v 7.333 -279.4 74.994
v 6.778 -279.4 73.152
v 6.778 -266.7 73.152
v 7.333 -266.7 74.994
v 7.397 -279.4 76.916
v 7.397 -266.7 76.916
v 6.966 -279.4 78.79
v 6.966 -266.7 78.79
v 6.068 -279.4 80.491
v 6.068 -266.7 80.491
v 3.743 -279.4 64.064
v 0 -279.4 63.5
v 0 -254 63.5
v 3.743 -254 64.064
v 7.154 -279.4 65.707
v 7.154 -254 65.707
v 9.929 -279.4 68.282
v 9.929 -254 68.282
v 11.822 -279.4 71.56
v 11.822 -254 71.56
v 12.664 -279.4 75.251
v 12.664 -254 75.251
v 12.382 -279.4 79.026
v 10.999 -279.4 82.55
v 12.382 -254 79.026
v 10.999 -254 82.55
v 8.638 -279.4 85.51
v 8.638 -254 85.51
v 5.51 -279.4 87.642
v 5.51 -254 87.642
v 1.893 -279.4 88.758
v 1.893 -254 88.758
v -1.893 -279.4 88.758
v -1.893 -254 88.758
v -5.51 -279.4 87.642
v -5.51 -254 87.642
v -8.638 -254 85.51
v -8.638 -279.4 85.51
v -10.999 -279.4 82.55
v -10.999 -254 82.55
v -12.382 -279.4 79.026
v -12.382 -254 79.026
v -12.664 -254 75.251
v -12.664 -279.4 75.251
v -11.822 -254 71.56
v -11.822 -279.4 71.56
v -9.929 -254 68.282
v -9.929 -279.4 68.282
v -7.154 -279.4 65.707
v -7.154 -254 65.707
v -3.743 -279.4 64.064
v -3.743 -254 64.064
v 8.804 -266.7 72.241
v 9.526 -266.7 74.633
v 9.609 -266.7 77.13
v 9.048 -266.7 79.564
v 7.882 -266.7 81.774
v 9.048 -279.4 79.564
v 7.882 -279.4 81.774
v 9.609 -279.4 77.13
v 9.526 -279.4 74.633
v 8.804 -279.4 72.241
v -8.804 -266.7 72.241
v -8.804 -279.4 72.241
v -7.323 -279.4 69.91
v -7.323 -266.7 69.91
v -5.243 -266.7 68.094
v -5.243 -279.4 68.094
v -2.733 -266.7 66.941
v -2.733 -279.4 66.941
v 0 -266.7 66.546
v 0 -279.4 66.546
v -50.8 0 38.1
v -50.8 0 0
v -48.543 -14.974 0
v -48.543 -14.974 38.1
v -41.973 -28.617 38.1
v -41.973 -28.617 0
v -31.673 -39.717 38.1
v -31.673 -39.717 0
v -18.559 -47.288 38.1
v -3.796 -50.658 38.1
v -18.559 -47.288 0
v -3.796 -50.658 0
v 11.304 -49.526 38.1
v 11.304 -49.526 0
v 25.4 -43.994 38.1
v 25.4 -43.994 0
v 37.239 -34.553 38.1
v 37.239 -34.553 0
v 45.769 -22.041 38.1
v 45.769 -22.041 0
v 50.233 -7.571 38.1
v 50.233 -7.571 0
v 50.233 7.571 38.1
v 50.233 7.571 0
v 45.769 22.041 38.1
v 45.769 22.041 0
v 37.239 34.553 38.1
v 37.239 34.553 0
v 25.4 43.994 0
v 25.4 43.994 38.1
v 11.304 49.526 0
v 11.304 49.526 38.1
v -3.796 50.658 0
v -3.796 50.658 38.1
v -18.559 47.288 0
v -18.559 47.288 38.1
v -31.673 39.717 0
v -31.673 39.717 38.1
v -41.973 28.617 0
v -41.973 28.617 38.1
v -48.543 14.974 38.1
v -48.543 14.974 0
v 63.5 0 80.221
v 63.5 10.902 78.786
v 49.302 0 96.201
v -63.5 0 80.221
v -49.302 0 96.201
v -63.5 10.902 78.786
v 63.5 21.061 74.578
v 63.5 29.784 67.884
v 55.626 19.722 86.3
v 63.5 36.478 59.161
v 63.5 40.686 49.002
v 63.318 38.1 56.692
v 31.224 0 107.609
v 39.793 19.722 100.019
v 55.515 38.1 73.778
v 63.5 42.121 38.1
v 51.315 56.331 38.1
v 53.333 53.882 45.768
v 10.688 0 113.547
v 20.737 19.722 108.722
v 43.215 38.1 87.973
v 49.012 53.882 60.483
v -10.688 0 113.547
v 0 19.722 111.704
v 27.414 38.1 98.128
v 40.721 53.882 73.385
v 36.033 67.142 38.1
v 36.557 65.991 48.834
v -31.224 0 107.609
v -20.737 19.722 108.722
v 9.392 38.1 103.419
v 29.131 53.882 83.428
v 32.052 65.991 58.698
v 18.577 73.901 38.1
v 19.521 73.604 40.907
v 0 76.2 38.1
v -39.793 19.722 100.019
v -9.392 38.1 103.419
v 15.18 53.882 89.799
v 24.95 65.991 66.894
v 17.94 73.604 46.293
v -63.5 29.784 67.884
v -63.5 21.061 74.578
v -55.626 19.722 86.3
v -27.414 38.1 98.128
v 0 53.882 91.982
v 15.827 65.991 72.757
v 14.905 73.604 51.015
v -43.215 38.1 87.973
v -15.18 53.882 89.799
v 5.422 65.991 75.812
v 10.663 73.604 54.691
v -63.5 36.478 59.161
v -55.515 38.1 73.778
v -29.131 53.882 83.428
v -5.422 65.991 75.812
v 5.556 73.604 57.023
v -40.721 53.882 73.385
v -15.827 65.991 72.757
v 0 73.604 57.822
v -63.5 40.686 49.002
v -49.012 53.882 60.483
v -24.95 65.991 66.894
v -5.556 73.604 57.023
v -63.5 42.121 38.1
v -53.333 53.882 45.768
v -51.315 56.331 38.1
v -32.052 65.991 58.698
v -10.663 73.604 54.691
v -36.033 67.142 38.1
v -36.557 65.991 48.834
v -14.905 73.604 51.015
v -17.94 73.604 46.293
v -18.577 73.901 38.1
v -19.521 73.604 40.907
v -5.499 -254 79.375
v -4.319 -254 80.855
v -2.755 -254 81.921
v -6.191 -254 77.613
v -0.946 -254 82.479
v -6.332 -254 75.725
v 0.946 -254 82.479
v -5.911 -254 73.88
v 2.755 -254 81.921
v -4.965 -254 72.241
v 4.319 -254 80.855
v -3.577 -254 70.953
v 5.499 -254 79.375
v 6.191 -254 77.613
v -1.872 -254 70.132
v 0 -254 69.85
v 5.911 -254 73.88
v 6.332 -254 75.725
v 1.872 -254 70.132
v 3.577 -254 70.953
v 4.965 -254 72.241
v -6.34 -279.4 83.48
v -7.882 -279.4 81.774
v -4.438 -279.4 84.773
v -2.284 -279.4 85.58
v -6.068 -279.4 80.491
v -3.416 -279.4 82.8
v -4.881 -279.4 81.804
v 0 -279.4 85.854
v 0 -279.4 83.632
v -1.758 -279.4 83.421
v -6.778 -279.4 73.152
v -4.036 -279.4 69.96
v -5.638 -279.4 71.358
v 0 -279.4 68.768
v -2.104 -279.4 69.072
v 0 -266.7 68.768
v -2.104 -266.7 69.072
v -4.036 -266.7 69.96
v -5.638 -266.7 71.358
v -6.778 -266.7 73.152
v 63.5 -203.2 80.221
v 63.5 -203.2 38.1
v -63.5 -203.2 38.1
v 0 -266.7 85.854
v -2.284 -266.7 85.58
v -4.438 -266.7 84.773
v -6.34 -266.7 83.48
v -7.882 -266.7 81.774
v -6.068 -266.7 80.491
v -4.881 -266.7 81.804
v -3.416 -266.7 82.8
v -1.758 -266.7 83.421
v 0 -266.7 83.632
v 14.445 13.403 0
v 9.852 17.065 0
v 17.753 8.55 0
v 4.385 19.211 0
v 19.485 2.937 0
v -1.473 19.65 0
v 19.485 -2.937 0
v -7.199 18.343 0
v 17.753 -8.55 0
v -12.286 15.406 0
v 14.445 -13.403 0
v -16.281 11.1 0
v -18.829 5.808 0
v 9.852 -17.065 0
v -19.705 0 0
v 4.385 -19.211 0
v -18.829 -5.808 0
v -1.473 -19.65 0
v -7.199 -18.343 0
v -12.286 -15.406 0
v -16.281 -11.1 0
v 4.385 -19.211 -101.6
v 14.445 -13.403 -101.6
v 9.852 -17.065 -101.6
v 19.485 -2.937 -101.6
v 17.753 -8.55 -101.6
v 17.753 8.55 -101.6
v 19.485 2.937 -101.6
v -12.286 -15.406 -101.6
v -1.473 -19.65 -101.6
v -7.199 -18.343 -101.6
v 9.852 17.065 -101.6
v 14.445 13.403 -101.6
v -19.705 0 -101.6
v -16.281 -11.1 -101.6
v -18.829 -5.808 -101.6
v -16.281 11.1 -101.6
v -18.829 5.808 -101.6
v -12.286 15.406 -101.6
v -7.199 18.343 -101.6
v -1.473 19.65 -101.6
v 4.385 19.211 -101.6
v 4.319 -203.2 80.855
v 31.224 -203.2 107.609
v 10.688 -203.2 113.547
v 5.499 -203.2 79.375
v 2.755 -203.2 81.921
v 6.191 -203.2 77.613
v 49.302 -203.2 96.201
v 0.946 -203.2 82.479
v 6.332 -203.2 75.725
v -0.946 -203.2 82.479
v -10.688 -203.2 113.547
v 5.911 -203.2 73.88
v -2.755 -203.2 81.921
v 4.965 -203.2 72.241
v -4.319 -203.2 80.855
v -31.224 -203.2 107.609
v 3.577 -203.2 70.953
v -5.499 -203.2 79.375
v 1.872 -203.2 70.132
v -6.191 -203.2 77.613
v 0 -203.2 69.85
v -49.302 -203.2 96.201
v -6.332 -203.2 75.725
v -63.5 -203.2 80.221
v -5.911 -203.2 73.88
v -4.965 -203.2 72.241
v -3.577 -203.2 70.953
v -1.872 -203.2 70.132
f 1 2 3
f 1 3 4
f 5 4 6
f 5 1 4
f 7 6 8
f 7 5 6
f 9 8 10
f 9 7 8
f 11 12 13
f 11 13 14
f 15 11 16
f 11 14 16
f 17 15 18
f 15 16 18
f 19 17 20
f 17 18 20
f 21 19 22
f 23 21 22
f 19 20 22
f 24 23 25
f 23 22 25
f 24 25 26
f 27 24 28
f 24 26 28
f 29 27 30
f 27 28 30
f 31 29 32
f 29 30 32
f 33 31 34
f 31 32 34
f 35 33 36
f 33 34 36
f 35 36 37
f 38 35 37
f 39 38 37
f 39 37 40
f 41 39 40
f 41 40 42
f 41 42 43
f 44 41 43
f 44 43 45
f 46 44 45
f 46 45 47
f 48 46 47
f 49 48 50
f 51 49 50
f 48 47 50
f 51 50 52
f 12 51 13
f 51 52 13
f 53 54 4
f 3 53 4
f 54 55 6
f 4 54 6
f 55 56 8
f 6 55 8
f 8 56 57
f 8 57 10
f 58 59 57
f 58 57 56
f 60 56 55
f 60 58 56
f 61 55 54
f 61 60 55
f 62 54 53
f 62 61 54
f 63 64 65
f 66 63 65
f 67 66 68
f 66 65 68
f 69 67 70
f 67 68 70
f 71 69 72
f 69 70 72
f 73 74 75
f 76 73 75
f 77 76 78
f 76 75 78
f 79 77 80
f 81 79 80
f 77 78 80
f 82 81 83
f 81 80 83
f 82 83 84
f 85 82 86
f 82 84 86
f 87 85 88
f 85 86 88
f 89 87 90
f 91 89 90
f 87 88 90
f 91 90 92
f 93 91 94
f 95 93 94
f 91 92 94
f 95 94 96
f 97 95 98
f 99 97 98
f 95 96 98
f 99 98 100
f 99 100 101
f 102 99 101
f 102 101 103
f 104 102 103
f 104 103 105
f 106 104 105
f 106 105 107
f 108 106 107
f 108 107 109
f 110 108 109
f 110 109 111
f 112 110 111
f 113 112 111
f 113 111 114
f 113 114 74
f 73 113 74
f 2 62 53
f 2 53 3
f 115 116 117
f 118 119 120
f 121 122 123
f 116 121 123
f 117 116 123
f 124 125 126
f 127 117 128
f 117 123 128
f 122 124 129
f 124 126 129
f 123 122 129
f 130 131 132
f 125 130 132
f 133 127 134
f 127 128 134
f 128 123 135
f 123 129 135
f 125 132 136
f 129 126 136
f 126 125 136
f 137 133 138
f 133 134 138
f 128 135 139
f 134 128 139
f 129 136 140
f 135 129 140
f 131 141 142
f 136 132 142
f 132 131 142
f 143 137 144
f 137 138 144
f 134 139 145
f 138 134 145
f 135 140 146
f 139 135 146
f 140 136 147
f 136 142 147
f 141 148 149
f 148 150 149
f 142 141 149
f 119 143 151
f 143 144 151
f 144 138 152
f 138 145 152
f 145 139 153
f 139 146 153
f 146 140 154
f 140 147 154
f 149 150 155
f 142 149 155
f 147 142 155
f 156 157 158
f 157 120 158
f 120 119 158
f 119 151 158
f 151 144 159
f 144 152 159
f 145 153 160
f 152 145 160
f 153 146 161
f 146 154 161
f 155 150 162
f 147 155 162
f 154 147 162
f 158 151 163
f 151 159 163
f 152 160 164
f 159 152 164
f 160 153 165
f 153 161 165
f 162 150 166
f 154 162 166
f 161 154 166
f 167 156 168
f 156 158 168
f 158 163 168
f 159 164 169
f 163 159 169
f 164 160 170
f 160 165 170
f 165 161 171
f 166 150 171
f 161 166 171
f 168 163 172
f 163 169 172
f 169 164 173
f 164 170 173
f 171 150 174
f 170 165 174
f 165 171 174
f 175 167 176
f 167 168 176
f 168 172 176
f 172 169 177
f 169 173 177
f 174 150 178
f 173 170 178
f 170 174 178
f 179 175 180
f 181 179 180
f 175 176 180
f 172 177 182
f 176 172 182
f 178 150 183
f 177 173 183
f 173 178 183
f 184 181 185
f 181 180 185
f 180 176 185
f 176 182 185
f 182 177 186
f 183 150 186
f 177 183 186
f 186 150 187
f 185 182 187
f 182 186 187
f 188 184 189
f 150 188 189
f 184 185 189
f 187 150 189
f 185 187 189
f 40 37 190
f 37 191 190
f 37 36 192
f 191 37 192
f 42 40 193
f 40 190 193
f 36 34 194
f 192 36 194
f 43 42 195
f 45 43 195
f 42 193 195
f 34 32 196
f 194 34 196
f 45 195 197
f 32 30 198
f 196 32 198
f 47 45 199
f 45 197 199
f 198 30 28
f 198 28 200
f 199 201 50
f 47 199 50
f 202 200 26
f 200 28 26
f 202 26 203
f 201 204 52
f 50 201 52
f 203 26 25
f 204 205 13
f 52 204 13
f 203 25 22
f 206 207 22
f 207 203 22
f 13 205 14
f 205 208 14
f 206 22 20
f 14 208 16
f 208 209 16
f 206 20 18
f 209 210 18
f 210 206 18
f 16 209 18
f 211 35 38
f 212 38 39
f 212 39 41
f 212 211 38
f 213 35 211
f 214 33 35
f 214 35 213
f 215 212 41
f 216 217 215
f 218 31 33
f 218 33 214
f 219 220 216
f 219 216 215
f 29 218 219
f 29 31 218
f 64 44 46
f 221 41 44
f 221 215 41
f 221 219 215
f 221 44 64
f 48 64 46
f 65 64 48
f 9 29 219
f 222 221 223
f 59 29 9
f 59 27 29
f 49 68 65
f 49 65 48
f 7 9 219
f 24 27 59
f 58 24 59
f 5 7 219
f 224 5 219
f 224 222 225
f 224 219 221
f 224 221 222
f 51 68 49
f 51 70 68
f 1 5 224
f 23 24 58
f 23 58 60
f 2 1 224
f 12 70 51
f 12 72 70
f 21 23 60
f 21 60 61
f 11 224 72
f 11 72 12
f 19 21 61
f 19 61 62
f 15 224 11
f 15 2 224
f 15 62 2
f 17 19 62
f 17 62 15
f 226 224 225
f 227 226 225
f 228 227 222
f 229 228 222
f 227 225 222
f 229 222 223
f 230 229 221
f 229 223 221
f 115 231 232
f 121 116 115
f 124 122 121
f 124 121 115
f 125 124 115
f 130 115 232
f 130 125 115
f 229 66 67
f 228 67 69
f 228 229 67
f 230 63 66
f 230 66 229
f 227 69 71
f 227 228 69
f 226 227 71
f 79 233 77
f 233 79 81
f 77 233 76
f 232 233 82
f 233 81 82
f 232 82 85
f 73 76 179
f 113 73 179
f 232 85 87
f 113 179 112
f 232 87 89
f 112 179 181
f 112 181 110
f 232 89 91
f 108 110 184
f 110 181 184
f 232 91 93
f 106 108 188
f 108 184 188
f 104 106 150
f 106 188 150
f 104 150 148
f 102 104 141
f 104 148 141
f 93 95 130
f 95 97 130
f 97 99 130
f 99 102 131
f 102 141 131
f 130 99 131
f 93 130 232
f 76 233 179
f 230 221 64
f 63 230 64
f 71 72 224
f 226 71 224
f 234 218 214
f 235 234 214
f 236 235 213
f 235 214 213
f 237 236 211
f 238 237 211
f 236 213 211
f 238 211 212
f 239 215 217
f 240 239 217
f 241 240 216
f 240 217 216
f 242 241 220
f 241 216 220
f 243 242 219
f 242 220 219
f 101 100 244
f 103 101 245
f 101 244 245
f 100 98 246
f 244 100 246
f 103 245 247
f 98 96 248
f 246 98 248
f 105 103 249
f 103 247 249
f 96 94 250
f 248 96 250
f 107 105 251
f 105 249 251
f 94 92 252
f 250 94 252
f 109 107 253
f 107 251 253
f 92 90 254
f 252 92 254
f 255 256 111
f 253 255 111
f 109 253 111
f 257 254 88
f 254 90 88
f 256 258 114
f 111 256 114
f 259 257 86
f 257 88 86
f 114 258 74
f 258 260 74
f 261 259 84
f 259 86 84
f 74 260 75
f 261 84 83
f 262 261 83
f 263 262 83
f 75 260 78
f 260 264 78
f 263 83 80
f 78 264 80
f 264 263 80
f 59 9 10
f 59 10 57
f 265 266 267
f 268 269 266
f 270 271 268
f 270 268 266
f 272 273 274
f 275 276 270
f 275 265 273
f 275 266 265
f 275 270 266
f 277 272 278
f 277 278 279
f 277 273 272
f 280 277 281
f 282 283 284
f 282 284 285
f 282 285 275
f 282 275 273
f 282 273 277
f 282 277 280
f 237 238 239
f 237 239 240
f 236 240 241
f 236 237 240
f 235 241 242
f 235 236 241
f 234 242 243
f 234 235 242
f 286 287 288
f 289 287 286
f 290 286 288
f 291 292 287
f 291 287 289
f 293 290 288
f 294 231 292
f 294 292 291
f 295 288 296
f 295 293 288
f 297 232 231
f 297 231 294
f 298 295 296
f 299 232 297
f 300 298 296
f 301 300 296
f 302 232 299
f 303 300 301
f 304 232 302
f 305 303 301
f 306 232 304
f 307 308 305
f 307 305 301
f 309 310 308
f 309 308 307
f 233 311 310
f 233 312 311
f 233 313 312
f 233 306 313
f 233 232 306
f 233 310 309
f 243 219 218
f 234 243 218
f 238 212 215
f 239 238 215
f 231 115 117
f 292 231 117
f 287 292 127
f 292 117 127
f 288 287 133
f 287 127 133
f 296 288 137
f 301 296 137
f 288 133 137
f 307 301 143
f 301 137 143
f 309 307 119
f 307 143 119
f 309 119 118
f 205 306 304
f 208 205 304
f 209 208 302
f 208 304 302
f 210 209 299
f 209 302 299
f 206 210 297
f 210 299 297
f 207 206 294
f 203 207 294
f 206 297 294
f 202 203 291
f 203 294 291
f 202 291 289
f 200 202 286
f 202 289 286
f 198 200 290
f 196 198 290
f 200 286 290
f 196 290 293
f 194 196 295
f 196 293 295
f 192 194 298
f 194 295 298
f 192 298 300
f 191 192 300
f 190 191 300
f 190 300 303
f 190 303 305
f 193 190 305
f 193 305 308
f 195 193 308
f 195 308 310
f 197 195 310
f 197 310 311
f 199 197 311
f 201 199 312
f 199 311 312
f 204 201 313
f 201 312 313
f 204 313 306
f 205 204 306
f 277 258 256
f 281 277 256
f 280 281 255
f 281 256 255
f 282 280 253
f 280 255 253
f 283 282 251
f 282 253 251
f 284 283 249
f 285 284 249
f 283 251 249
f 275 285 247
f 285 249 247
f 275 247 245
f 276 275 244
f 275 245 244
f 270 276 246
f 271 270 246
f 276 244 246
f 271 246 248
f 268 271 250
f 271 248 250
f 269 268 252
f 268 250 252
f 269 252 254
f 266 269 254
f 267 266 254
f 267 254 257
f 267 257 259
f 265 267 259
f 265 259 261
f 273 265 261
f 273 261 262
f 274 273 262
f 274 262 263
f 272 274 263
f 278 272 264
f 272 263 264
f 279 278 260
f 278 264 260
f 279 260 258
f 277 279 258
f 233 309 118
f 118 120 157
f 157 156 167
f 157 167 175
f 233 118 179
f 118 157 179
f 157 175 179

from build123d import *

# Parameters (mm, degrees)
SKETCH1_R           = 50.8
BOSS_EXTRUDE1_DEPTH = 38.1
REVOLVE1_ANGLE      = 180
BOSS_EXTRUDE2_DEPTH = 203.2
SKETCH5_W           = 76.2
SKETCH5_H           = 279.4
CUT_EXTRUDE1_DEPTH  = 12.7
SKETCH6_R           = 19.704792108
BOSS_EXTRUDE3_DEPTH = 101.6
SKETCH7_R           = 6.35
BOSS_EXTRUDE4_DEPTH = 50.8
SKETCH8_R           = 12.7
BOSS_EXTRUDE5_DEPTH = 25.4
CUT_EXTRUDE2_DEPTH  = 12.7


with BuildPart() as part:
    # Sketch1 → Boss-Extrude1 (new body)
    with BuildSketch(Plane.XY):
        with Locations(Location((0, 0, 0), (0, 0, 180))):
            Circle(SKETCH1_R)
    extrude(amount=BOSS_EXTRUDE1_DEPTH)

    # Sketch2 → Revolve1 (revolve)
    with BuildSketch(Plane.XY.offset(38.1)):
        with BuildLine():
            Line((0, 76.2), (0, -76.2))
            ThreePointArc((0, -76.2), (76.2, 0), (0, 76.2))
        make_face()
    revolve(axis=Axis((0, 76.2, 38.1), (0, -1, 0)), revolution_arc=REVOLVE1_ANGLE)

    # Sketch3 → Boss-Extrude2 (add)
    with BuildSketch(Plane(origin=(0, 0, 0), x_dir=(1, 0, 0), z_dir=(0, 1, 0))):
        with BuildLine():
            Line((-76.2, -38.1), (76.2, -38.1))
            ThreePointArc((76.2, -38.1), (0, -114.3), (-76.2, -38.1))
        make_face()
    extrude(amount=-BOSS_EXTRUDE2_DEPTH)

    # Sketch5 → Cut-Extrude1 (cut)
    with BuildSketch(Plane(origin=(76.2, 0, 0), x_dir=(0, 0, -1), z_dir=(1, 0, 0))):
        with Locations((-76.2, -63.5)):
            Rectangle(SKETCH5_W, SKETCH5_H)
    cut_extrude1 = extrude(amount=-CUT_EXTRUDE1_DEPTH, mode=Mode.SUBTRACT)

    # Mirror1: Cut-Extrude1 across plane
    add(cut_extrude1.mirror(Plane(origin=(0, 0, 0), x_dir=(0, 0, 1), z_dir=(1, 0, 0))), mode=Mode.SUBTRACT)

    # Sketch6 → Boss-Extrude3 (add)
    with BuildSketch(Plane(origin=(0, 0, 0), x_dir=(-1, 0, 0), z_dir=(0, 0, -1))):
        Circle(SKETCH6_R)
    extrude(amount=BOSS_EXTRUDE3_DEPTH)

    # Sketch7 → Boss-Extrude4 (add)
    with BuildSketch(Plane.XZ.offset(203.2)):
        with Locations(Location((0, 76.2, 0), (0, 0, 270))):
            Circle(SKETCH7_R)
    extrude(amount=BOSS_EXTRUDE4_DEPTH)

    # Sketch8 → Boss-Extrude5 (add)
    with BuildSketch(Plane.XZ.offset(254)):
        with Locations(Location((0, 76.2, 0), (0, 0, 270))):
            Circle(SKETCH8_R)
    extrude(amount=BOSS_EXTRUDE5_DEPTH)

    # Sketch9 → Cut-Extrude2 (cut)
    with BuildSketch(Plane.XZ.offset(279.4)):
        with BuildLine():
            Line((0, 83.631744278), (0, 85.853587437))
            ThreePointArc((0, 85.853587437), (-4.437705251, 84.773127931), (-7.882046977, 81.773606182))
            Line((-7.882046977, 81.773606182), (-6.067936702, 80.490800298))
            ThreePointArc((-6.067936702, 80.490800298), (-3.416335204, 82.799960363), (0, 83.631744278))
        make_face()
        with BuildLine():
            Line((6.067936702, 80.490800298), (7.882046977, 81.773606182))
            ThreePointArc((7.882046977, 81.773606182), (9.608703215, 77.129824142), (8.804494423, 72.241132945))
            Line((8.804494423, 72.241132945), (6.778076179, 73.152294908))
            ThreePointArc((6.778076179, 73.152294908), (7.397190485, 76.915818372), (6.067936702, 80.490800298))
        make_face()
        with BuildLine():
            Line((-6.778076179, 73.152294908), (-8.804494423, 72.241132945))
            ThreePointArc((-8.804494423, 72.241132945), (-5.242827536, 68.094168159), (0, 66.546412563))
            Line((0, 66.546412563), (0, 68.768255722))
            ThreePointArc((0, 68.768255722), (-4.036152756, 69.959784142), (-6.778076179, 73.152294908))
        make_face()
    extrude(amount=-CUT_EXTRUDE2_DEPTH, mode=Mode.SUBTRACT)


solid = part.part
